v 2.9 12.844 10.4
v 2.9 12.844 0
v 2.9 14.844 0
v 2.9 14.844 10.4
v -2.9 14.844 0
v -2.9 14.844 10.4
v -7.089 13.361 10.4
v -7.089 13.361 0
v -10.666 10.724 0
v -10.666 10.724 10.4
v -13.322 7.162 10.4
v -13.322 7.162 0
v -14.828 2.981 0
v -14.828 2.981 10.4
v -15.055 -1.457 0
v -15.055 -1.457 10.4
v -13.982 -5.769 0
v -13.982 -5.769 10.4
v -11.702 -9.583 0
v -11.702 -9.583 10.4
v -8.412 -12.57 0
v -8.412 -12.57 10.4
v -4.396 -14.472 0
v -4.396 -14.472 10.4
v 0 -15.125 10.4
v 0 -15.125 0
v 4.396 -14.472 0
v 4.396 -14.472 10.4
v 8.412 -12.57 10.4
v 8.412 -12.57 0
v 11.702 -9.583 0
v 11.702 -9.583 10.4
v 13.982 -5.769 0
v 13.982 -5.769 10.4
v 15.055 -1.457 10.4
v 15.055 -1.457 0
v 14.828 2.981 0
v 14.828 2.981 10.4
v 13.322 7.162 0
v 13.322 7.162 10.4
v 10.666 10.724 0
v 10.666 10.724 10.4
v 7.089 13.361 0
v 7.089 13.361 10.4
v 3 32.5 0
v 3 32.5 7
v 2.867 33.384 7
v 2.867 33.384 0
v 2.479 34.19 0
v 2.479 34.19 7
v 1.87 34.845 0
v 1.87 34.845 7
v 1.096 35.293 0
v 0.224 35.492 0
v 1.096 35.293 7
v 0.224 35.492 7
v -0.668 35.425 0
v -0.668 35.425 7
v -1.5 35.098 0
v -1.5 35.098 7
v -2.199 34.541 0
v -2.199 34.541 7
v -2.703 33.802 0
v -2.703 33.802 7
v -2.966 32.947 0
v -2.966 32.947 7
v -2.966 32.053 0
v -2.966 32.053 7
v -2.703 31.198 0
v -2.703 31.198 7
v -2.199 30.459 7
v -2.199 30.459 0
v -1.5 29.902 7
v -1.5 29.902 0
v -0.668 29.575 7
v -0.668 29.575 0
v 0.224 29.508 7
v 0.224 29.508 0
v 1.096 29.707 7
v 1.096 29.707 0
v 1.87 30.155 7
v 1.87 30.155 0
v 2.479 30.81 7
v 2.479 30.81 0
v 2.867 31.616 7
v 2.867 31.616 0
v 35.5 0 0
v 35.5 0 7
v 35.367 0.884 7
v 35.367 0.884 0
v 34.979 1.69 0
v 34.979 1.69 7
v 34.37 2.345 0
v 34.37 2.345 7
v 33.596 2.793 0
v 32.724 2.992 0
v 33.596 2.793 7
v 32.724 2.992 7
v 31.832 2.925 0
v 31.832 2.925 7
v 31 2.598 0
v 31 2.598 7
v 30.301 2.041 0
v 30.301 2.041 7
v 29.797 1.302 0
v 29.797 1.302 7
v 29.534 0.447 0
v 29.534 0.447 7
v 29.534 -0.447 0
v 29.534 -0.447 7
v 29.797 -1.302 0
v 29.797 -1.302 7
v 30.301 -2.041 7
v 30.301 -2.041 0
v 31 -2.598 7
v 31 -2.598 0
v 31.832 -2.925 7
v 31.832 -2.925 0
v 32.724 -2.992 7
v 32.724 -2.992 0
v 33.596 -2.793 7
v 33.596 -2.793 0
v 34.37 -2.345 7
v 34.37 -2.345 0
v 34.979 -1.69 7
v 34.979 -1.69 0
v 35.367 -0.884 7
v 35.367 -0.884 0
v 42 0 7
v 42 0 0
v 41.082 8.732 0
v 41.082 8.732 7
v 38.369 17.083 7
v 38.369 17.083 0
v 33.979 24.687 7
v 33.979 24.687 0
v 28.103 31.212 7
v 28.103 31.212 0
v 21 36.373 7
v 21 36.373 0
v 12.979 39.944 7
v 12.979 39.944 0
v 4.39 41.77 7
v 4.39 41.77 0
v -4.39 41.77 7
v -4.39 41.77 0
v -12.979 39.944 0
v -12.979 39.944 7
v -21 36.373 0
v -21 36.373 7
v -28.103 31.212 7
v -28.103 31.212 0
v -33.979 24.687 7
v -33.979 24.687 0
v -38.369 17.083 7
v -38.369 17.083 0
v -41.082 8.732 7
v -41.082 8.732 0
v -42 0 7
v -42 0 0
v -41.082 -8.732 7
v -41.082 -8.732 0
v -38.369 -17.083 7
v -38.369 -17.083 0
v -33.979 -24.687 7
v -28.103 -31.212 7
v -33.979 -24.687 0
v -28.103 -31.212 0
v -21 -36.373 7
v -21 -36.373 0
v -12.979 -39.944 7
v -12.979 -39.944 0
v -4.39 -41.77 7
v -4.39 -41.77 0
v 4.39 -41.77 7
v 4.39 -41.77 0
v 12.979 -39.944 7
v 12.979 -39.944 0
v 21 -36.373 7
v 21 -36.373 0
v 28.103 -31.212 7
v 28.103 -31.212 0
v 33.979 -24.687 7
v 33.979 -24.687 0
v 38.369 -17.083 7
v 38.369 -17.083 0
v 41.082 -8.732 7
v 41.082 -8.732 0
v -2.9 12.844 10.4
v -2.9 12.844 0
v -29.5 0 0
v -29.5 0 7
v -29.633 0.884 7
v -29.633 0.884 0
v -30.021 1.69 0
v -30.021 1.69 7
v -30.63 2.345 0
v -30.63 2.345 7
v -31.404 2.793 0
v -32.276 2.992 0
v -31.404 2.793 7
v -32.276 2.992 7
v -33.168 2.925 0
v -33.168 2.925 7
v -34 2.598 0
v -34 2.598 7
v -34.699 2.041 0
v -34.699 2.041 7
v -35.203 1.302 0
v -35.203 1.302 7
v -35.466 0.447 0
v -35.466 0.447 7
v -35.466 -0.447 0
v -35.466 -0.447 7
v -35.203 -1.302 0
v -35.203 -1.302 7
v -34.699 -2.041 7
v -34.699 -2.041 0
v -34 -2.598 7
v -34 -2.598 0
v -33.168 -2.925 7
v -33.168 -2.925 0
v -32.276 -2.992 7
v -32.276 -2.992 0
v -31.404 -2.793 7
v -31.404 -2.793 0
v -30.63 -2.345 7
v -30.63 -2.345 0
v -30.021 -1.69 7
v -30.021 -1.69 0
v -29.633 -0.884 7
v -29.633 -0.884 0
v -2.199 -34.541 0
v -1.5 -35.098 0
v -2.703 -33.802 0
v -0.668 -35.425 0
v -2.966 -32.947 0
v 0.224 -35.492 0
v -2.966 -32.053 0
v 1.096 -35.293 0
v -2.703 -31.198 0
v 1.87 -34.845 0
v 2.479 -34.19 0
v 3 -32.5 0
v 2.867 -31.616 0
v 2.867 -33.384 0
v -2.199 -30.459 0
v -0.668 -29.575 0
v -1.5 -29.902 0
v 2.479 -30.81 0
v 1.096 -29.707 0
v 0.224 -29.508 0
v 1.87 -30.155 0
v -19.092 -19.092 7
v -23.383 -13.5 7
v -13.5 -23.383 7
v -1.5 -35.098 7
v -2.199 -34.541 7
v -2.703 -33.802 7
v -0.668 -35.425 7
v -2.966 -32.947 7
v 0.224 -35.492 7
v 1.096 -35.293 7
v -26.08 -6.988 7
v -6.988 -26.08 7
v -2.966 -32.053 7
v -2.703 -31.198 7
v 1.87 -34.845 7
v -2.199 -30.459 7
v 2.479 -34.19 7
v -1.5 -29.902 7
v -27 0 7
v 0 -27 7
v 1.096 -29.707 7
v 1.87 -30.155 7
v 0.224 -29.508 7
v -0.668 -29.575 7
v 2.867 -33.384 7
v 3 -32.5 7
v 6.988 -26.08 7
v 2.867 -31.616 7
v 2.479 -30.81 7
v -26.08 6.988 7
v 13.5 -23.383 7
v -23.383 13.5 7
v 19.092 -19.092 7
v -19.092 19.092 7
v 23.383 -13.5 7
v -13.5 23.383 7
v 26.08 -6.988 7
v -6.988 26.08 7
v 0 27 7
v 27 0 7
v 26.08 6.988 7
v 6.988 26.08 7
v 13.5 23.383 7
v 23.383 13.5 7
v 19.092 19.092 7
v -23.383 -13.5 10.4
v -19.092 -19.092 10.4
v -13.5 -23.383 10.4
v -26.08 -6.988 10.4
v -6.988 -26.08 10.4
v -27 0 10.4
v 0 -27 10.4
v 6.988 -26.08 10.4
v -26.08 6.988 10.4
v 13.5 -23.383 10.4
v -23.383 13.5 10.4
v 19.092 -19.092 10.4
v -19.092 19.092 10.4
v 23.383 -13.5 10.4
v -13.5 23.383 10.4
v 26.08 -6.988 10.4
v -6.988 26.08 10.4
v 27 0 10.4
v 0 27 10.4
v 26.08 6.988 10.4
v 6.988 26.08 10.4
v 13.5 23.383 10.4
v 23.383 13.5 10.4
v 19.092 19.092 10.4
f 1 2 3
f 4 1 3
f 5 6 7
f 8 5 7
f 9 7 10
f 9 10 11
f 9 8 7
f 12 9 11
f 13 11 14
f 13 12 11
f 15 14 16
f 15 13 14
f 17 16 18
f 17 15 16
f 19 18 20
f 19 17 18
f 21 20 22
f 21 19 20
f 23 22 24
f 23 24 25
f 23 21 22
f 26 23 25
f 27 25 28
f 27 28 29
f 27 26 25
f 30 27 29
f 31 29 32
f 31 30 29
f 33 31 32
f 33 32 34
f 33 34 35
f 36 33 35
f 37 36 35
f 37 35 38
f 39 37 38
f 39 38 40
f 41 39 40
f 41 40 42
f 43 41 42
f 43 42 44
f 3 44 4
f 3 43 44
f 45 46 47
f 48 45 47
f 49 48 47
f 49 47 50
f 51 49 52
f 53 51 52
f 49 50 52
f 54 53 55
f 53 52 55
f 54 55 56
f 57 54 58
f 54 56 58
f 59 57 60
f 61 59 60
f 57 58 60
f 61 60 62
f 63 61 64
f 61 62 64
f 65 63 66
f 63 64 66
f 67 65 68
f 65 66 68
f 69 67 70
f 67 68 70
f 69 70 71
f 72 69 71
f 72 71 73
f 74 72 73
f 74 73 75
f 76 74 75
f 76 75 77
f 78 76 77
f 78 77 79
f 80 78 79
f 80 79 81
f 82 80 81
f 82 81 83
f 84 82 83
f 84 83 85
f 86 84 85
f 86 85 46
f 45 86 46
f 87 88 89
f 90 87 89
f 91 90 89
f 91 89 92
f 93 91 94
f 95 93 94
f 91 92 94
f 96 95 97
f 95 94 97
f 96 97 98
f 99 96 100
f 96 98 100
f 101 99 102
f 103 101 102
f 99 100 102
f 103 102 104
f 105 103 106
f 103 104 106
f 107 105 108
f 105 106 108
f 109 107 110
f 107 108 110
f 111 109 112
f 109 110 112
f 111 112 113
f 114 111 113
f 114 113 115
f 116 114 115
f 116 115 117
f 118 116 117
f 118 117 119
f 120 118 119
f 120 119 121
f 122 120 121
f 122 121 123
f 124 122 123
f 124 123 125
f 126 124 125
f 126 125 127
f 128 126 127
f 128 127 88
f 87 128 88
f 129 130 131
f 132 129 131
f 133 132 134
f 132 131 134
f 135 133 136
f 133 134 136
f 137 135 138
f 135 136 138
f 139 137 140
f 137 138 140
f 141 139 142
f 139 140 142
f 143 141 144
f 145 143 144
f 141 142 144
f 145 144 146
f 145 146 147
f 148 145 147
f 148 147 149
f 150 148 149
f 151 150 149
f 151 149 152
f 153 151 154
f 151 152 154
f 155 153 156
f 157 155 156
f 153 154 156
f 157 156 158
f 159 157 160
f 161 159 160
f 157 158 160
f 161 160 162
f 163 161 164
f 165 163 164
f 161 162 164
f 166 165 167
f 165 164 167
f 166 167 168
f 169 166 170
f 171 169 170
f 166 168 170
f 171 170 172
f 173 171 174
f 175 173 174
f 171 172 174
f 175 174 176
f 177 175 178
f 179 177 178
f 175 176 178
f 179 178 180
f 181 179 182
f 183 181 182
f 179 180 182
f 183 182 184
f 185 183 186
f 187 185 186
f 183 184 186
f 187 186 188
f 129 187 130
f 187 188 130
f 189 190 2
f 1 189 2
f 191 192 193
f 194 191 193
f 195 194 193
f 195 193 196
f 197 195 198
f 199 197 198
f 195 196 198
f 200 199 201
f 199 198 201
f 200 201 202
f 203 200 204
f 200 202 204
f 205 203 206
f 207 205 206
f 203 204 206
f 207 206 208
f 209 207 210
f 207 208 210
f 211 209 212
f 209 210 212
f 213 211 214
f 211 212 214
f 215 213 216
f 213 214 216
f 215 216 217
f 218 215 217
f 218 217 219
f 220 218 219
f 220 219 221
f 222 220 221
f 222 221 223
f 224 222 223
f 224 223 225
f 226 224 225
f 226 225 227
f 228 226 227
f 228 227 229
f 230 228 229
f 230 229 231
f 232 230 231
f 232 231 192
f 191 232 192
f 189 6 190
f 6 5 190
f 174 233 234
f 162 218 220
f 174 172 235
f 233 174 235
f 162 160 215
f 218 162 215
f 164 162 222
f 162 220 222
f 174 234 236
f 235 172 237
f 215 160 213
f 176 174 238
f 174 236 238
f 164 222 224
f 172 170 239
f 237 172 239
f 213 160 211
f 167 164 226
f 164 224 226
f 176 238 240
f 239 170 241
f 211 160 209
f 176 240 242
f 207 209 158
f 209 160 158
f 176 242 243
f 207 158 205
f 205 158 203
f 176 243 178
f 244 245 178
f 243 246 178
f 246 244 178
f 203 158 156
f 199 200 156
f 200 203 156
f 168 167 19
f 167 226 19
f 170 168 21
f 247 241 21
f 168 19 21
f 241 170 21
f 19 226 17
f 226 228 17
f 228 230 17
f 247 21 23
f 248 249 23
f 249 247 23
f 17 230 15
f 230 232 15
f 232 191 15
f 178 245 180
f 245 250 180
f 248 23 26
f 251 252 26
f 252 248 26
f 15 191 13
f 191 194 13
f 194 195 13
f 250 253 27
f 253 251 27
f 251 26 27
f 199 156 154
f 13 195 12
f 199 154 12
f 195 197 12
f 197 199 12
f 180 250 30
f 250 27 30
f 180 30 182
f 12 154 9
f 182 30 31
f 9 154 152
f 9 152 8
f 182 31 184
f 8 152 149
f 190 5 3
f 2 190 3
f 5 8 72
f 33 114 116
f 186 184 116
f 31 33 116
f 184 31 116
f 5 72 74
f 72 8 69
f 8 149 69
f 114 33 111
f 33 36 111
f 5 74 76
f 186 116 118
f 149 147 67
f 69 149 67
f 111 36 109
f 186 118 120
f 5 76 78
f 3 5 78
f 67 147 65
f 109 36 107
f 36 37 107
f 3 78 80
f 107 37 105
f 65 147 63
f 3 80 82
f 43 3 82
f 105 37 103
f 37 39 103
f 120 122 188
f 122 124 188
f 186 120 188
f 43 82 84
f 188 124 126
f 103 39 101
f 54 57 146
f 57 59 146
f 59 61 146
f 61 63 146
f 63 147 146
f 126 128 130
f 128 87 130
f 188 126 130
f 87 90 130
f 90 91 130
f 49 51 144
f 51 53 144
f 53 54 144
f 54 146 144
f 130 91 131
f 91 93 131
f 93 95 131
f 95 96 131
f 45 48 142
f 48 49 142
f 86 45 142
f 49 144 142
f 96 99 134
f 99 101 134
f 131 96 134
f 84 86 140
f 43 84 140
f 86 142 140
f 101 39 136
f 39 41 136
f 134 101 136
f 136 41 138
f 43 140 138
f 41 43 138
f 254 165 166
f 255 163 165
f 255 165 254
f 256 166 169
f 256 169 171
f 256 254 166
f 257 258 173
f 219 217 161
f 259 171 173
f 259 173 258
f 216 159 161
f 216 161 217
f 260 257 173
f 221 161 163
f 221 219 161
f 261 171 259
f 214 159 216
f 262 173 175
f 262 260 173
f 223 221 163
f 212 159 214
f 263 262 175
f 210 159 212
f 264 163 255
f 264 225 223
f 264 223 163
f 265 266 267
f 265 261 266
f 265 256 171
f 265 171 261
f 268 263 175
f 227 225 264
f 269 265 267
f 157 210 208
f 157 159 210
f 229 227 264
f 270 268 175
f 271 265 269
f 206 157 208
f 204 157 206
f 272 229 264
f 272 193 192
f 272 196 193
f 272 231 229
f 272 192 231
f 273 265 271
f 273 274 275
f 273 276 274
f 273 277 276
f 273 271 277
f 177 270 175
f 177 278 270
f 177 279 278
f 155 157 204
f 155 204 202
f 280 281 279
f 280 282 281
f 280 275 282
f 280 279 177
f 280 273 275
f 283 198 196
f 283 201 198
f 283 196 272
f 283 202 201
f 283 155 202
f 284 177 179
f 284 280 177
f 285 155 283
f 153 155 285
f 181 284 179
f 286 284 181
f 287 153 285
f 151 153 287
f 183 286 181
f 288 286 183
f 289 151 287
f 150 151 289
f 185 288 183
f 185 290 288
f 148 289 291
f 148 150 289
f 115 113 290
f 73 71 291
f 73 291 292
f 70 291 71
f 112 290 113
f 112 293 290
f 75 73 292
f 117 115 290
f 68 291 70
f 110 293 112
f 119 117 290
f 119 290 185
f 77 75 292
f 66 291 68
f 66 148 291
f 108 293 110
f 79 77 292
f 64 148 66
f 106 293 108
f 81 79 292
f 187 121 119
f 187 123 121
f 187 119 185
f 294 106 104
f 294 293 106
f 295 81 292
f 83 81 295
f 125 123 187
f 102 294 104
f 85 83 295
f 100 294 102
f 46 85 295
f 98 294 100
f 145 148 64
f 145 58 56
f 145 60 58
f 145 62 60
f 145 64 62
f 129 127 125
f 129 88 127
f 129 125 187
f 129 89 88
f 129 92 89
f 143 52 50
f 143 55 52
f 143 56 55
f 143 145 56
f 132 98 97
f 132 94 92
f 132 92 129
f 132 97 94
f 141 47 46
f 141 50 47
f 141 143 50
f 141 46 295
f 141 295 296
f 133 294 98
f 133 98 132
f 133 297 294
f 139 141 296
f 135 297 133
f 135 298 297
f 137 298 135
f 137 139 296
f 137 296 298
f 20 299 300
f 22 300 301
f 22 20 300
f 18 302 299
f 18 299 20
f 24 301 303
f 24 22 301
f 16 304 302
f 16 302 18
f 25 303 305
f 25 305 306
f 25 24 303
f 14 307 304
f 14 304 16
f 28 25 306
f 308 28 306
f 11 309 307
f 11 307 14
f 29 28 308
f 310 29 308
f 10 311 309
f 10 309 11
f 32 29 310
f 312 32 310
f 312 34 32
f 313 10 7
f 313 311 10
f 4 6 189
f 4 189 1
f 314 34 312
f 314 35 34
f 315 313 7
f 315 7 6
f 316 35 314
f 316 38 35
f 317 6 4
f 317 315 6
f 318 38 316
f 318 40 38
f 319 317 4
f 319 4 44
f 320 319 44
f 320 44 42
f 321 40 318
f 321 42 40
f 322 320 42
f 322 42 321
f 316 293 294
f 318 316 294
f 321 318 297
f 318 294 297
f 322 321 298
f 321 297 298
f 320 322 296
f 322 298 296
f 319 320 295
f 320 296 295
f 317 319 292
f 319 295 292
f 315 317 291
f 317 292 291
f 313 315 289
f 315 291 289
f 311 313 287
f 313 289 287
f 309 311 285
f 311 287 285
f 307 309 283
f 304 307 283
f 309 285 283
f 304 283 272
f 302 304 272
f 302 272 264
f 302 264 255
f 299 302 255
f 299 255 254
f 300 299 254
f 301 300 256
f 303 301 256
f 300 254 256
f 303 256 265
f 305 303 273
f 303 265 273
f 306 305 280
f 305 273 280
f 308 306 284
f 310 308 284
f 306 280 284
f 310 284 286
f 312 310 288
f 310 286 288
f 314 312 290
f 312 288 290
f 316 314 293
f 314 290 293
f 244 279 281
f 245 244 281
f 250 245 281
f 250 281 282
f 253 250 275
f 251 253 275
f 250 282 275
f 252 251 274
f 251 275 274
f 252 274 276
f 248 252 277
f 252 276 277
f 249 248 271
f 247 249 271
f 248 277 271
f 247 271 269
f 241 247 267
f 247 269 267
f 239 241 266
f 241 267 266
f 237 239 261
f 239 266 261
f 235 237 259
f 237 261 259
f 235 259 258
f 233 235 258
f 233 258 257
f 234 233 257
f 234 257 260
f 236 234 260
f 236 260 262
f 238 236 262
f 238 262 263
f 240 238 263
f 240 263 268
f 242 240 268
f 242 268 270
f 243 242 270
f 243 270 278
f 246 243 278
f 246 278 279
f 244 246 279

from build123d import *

# Parameters (mm, degrees)
SKETCH_R     = 42
PAD_DEPTH    = 7
SKETCH003_R  = 27
PAD001_DEPTH = 3.4
SKETCH004_R  = 3
HOLE_DEPTH   = 25


with BuildPart() as part:
    # Sketch → Pad (new body)
    with BuildSketch(Plane.XY):
        Circle(SKETCH_R)
        with BuildLine():
            Line((-2.9, 14.84438), (-2.9, 12.84438))
            Line((-2.9, 12.84438), (2.9, 12.84438))
            Line((2.9, 12.84438), (2.9, 14.84438))
            ThreePointArc((-2.9, 14.84438), (0, -15.125), (2.9, 14.84438))
        make_face(mode=Mode.SUBTRACT)
    extrude(amount=PAD_DEPTH)

    # Sketch003 (on Face7 of Pad) → Pad001 (join)
    with BuildSketch(Plane.XY.offset(7)):
        Circle(SKETCH003_R)
        with BuildLine():
            ThreePointArc((-2.9, 14.84438), (0, -15.125), (2.9, 14.84438))
            Line((2.9, 12.84438), (2.9, 14.84438))
            Line((-2.9, 12.84438), (2.9, 12.84438))
            Line((-2.9, 14.84438), (-2.9, 12.84438))
        make_face(mode=Mode.SUBTRACT)
    extrude(amount=PAD001_DEPTH)

    # Sketch004 (on Face3 of Pad001) → Hole (cut)
    with BuildSketch(Plane.XY.offset(7)):
        with Locations((0, 32.5)):
            Circle(SKETCH004_R)
        with Locations((0, -32.5)):
            Circle(SKETCH004_R)
        with Locations((32.5, 0)):
            Circle(SKETCH004_R)
        with Locations((-32.5, 0)):
            Circle(SKETCH004_R)
    extrude(amount=-HOLE_DEPTH, mode=Mode.SUBTRACT)


solid = part.part
